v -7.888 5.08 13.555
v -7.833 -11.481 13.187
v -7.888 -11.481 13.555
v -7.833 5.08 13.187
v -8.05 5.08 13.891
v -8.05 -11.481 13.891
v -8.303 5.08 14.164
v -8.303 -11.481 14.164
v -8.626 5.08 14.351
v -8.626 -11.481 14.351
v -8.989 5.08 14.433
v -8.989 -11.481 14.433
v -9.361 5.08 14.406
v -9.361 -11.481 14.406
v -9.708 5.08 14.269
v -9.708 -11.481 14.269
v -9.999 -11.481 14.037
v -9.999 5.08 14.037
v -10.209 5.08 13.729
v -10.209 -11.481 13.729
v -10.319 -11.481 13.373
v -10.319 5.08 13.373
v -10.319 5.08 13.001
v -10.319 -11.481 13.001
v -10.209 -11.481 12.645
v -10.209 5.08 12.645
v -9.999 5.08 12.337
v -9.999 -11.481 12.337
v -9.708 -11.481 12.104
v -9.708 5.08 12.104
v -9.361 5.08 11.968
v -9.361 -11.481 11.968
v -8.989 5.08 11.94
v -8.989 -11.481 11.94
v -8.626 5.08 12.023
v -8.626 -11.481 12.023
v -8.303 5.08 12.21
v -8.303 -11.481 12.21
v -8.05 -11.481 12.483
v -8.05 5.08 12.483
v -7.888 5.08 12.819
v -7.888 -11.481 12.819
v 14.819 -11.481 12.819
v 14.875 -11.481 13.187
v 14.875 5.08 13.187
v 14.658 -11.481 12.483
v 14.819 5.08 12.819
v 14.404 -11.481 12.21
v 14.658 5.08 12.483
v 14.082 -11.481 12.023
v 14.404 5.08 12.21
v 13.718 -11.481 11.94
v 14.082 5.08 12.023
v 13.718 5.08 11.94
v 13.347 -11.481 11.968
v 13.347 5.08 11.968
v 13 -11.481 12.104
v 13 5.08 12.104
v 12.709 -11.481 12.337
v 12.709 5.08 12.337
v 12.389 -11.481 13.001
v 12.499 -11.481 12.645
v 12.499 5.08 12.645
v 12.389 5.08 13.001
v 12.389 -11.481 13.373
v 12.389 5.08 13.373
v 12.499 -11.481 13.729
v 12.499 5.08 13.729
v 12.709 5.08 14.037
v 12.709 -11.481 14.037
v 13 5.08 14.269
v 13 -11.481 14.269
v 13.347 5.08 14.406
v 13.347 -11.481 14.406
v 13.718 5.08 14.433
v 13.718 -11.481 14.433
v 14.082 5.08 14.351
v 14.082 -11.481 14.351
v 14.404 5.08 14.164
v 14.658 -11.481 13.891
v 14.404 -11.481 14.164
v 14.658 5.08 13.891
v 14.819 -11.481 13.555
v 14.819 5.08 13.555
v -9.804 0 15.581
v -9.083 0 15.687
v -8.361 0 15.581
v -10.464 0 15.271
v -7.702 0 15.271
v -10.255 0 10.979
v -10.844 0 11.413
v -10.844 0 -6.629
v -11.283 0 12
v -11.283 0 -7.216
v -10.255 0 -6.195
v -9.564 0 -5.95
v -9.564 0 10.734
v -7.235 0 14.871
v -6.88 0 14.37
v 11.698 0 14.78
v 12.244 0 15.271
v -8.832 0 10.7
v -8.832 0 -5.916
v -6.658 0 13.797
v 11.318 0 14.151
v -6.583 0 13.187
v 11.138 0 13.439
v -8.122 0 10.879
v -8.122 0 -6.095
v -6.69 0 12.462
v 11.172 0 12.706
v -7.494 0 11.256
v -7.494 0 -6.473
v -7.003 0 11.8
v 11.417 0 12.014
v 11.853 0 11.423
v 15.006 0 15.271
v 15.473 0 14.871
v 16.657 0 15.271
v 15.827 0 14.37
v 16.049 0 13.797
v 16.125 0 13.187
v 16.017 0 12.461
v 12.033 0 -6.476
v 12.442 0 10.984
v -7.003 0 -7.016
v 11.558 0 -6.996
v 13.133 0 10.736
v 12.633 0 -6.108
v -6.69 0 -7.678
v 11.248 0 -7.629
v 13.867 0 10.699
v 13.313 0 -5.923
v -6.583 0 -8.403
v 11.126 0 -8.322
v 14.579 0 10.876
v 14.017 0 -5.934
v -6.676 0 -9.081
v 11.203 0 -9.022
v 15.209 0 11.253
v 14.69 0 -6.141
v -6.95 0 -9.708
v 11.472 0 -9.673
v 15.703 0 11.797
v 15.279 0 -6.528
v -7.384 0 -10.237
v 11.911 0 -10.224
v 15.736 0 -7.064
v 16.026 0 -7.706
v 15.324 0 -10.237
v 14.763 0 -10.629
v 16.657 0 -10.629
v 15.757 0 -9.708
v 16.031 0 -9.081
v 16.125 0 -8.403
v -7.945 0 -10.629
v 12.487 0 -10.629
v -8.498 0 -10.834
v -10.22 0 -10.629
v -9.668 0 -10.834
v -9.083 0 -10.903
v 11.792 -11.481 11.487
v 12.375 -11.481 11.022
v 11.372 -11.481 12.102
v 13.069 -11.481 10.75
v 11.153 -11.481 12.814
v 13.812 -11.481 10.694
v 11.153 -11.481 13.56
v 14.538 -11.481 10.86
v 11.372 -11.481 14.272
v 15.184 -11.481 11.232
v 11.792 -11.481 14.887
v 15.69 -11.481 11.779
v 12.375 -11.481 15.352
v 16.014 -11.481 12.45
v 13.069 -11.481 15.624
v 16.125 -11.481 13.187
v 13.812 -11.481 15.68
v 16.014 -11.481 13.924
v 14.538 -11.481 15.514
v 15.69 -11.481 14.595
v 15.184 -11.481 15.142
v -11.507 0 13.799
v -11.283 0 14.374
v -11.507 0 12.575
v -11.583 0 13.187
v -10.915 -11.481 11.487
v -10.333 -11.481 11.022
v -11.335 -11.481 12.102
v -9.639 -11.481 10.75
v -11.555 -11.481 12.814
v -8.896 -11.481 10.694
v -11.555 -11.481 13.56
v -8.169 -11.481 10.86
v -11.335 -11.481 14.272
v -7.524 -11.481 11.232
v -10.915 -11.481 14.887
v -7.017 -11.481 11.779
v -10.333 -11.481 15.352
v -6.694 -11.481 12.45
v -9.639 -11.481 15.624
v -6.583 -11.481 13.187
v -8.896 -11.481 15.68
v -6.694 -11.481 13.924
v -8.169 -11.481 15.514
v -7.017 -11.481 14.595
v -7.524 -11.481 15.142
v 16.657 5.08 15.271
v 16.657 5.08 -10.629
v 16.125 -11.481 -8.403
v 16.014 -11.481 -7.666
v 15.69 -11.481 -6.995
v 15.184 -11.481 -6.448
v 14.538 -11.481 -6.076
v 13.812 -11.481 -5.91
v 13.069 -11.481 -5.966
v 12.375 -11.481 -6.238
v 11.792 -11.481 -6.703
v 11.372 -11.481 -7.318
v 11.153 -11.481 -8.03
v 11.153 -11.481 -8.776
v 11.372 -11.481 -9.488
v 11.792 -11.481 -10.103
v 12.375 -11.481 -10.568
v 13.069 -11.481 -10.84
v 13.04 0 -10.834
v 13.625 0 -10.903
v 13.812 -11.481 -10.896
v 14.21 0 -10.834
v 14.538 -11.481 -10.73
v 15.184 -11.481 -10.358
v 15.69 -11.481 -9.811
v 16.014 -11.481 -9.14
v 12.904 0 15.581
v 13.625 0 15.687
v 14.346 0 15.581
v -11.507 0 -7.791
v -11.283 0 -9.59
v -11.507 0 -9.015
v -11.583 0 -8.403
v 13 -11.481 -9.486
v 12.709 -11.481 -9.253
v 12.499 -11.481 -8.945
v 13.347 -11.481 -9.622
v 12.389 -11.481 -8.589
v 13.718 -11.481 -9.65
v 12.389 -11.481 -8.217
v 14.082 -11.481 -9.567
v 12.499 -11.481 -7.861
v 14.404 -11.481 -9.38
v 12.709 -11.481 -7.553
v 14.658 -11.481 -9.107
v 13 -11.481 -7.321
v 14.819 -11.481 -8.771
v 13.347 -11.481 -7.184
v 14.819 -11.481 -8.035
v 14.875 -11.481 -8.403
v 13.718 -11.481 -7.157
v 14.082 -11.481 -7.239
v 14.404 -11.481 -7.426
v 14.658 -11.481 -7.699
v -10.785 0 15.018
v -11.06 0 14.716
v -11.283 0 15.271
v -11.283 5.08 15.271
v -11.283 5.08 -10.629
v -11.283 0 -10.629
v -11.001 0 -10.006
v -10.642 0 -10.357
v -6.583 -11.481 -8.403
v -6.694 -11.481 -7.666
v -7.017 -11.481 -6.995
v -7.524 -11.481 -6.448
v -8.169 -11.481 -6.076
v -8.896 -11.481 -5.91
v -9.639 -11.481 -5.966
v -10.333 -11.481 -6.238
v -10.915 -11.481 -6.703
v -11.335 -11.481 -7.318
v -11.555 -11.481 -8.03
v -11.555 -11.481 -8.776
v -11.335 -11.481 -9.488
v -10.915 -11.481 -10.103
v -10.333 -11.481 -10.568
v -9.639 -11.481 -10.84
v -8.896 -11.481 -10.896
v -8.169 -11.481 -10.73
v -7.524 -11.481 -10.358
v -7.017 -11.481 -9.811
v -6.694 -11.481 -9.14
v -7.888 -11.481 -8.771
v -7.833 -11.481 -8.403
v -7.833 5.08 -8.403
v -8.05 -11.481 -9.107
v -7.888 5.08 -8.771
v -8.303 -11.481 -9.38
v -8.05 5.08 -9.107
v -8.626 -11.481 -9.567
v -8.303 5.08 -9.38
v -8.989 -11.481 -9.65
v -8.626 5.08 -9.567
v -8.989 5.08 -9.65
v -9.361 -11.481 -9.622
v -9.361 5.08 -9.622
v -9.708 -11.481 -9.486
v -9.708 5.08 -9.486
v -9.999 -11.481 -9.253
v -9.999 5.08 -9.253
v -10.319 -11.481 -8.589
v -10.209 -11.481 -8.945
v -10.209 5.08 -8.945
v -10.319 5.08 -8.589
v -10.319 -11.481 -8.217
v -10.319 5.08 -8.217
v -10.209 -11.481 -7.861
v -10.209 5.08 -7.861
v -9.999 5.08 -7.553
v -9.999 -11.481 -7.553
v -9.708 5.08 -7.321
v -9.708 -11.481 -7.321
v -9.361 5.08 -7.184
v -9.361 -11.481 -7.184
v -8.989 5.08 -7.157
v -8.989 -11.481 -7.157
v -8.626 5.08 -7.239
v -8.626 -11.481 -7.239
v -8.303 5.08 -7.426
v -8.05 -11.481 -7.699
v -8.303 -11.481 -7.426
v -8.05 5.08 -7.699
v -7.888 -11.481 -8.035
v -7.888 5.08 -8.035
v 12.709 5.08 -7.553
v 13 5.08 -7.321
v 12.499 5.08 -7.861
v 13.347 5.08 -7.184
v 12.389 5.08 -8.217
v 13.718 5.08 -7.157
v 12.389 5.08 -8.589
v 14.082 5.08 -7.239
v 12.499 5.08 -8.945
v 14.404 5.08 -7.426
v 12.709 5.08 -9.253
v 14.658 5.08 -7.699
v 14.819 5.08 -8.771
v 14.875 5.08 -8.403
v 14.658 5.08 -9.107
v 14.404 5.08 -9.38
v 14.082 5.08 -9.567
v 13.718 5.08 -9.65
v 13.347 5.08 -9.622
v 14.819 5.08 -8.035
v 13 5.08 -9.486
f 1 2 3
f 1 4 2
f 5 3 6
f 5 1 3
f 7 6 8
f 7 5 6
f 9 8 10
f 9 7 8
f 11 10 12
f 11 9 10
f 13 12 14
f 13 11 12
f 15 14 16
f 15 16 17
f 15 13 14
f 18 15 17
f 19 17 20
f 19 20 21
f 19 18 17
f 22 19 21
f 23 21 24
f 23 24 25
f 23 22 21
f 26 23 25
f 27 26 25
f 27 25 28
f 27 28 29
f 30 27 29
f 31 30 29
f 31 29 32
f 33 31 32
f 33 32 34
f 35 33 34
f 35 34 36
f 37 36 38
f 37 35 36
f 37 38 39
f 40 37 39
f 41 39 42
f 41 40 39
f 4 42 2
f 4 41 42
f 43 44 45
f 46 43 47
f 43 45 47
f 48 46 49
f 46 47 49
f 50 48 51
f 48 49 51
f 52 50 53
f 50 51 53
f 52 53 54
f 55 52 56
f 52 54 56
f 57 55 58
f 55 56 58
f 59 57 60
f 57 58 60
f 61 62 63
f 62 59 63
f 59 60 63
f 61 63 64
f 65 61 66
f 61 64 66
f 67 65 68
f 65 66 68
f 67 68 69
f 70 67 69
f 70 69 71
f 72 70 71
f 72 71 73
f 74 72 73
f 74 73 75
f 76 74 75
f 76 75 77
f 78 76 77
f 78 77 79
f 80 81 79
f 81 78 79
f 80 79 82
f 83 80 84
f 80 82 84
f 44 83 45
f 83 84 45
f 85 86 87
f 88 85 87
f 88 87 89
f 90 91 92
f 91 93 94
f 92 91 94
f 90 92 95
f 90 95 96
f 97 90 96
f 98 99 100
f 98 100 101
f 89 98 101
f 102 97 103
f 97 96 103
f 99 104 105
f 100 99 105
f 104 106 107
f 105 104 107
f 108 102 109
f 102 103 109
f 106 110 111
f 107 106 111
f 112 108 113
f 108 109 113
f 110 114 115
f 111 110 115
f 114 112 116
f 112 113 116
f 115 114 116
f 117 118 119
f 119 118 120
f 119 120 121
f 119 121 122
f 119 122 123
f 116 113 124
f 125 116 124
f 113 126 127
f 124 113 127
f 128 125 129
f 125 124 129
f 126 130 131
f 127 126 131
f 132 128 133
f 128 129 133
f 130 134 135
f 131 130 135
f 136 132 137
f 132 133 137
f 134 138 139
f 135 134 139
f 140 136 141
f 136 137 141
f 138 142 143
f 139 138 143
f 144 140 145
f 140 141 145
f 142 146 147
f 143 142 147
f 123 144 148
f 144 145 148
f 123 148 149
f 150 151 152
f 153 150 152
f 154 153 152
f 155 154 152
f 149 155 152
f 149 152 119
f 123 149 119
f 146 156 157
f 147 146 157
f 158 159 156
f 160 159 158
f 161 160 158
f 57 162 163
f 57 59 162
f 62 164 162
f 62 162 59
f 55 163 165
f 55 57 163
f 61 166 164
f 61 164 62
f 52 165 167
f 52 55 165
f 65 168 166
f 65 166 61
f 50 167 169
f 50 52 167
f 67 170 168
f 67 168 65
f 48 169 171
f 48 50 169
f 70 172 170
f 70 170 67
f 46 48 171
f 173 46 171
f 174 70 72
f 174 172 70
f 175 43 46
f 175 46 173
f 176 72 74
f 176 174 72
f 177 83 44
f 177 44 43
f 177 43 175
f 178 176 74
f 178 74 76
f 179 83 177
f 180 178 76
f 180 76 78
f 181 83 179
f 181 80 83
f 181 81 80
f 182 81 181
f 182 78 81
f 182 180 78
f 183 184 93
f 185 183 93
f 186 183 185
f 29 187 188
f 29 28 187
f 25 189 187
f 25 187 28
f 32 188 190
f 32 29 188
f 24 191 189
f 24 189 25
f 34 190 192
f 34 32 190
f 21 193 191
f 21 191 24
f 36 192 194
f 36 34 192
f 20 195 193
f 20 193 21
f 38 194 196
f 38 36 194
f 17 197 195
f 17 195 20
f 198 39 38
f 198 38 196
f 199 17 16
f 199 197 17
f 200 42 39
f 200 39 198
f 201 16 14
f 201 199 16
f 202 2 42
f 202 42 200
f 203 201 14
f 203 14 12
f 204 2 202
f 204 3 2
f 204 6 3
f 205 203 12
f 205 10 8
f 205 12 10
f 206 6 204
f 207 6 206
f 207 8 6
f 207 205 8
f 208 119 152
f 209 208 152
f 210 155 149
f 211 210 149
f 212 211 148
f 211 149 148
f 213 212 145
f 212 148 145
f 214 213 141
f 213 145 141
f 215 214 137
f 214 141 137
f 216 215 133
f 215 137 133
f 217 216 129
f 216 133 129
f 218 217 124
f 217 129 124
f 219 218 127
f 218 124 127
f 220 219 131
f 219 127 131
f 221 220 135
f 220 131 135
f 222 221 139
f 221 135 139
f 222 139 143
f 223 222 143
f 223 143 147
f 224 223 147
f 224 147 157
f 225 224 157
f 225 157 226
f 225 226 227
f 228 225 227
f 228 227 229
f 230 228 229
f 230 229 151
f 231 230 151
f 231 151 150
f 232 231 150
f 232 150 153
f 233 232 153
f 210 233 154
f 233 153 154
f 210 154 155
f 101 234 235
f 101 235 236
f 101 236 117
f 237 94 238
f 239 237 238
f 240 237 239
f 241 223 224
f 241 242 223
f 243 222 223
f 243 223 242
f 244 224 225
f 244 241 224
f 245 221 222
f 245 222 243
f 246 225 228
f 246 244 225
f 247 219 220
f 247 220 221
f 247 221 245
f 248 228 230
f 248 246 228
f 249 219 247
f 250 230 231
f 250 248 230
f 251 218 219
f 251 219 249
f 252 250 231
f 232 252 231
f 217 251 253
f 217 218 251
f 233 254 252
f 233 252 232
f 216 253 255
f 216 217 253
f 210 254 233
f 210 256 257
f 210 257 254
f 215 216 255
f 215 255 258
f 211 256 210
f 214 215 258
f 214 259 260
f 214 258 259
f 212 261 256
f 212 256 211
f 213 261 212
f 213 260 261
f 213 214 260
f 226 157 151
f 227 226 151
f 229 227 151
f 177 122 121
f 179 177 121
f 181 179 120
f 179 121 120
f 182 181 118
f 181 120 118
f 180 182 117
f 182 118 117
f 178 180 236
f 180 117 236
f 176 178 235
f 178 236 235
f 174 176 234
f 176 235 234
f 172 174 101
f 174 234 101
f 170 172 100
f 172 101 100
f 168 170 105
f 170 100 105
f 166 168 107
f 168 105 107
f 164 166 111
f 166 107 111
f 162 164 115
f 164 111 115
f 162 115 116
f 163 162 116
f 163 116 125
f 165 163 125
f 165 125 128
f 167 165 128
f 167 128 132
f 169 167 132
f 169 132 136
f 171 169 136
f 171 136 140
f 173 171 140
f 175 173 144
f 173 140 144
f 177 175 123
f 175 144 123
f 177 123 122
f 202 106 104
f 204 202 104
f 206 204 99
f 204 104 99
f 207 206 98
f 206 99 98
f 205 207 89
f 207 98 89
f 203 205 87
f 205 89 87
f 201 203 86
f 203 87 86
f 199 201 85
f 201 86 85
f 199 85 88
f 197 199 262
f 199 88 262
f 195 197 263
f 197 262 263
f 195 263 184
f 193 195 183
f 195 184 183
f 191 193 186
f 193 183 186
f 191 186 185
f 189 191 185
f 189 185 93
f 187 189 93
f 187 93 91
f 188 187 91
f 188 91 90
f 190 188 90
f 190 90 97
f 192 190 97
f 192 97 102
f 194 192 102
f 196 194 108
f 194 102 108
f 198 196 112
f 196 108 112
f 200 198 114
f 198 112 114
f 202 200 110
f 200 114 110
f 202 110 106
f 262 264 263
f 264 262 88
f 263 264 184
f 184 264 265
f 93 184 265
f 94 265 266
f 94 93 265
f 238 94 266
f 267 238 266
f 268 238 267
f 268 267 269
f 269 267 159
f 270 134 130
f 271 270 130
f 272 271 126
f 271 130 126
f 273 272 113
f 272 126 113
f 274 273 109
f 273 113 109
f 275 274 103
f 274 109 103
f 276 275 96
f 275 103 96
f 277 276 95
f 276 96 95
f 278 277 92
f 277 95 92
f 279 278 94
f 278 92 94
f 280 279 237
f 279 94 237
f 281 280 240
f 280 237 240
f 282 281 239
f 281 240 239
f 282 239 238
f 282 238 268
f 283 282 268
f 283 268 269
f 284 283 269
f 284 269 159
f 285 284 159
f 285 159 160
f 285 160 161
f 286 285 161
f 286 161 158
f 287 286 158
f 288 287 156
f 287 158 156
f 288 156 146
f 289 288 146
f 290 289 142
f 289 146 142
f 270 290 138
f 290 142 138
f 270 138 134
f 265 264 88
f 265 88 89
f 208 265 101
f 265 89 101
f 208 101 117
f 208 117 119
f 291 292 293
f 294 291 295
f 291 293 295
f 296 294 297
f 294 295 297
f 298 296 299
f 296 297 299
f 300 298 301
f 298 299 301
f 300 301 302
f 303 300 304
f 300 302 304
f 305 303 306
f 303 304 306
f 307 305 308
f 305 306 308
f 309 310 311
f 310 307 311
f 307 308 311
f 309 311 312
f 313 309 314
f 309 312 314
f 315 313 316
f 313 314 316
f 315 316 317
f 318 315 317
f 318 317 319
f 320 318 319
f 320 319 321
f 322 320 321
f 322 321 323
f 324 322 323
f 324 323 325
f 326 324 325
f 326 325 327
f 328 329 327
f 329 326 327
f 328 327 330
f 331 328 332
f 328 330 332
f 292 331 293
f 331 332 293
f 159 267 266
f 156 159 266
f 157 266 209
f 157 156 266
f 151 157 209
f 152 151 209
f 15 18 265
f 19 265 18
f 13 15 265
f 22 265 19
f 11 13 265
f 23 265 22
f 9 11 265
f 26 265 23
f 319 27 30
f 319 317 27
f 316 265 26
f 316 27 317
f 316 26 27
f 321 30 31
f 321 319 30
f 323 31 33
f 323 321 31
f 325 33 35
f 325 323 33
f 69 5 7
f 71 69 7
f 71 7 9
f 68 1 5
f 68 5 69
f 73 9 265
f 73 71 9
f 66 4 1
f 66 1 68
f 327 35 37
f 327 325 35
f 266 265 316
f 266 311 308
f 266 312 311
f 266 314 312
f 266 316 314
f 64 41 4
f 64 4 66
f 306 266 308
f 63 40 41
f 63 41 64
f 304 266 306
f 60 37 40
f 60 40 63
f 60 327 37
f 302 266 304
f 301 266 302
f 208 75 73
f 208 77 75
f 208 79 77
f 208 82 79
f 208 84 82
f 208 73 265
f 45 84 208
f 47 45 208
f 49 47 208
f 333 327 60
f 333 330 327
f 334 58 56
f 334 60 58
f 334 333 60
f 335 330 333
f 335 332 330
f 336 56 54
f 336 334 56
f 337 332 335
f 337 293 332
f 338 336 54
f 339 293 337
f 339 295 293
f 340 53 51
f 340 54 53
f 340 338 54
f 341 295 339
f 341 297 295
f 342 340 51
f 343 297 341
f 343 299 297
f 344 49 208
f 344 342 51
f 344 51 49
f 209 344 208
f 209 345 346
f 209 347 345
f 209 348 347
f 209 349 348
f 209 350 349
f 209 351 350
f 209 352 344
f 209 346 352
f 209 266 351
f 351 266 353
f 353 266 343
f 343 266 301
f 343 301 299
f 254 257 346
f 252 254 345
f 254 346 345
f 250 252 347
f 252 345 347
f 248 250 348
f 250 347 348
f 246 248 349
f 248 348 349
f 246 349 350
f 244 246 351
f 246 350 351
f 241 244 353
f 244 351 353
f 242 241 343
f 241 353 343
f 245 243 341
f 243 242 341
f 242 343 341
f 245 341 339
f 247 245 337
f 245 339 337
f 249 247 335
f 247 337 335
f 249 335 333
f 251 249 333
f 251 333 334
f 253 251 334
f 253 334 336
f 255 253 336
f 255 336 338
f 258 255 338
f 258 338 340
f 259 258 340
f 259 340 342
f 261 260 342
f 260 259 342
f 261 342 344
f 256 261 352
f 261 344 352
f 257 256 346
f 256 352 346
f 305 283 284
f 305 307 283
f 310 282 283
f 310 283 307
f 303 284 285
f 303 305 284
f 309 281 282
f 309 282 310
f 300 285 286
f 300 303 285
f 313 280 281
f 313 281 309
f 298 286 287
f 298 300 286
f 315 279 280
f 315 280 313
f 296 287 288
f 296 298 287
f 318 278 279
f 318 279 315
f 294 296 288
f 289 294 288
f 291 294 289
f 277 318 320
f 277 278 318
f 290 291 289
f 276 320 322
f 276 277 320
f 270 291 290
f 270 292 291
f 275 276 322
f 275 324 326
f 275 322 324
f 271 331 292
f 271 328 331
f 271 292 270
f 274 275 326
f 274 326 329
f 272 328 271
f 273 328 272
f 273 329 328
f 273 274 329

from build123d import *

# Parameters (mm, degrees)
SKETCH1_W               = 27.94
SKETCH1_H               = 25.9
BOSS_EXTRUDE1_DEPTH     = 5.08
SKETCH2_R               = 2.5
SKETCH2_R_2             = 1.25
BOSS_EXTRUDE2_DEPTH     = 11.4808
SKETCH3_R               = 1.25
CUT_EXTRUDE1_DEPTH      = 1
CUT_EXTRUDE1_DEPTH_BACK = 17.5608


with BuildPart() as part:
    # Sketch1 → Boss-Extrude1 (new body)
    with BuildSketch(Plane(origin=(0, 0, 0), x_dir=(1, 0, 0), z_dir=(0, 1, 0))):
        with Locations((2.687100719, -2.320830935)):
            Rectangle(SKETCH1_W, SKETCH1_H)
    extrude(amount=BOSS_EXTRUDE1_DEPTH)

    # Sketch2 → Boss-Extrude2 (add)
    with BuildSketch(Plane.XZ):
        with Locations((-9.082699611, 13.186946911)):
            Circle(SKETCH2_R)
        with Locations((-9.082699611, 13.186946911)):
            Circle(SKETCH2_R_2, mode=Mode.SUBTRACT)
        with Locations((13.624900389, 13.186946911)):
            Circle(SKETCH2_R)
        with Locations((13.624900389, 13.186946911)):
            Circle(SKETCH2_R_2, mode=Mode.SUBTRACT)
        with Locations((-9.082699611, -8.403053089)):
            Circle(SKETCH2_R)
        with Locations((-9.082699611, -8.403053089)):
            Circle(SKETCH2_R_2, mode=Mode.SUBTRACT)
        with Locations((13.624900389, -8.403053089)):
            Circle(SKETCH2_R)
        with Locations((13.624900389, -8.403053089)):
            Circle(SKETCH2_R_2, mode=Mode.SUBTRACT)
    extrude(amount=BOSS_EXTRUDE2_DEPTH)

    # Sketch3 → Cut-Extrude1 (cut, two sides)
    with BuildSketch(Plane(origin=(0, 5.08, 0), x_dir=(1, 0, 0), z_dir=(0, 1, 0))) as cut_extrude1_sk:
        with Locations((13.624900389, 8.403053089)):
            Circle(SKETCH3_R)
        with Locations((-9.082699611, 8.403053089)):
            Circle(SKETCH3_R)
        with Locations((13.624900389, -13.186946911)):
            Circle(SKETCH3_R)
        with Locations((-9.082699611, -13.186946911)):
            Circle(SKETCH3_R)
    extrude(amount=CUT_EXTRUDE1_DEPTH, mode=Mode.SUBTRACT)
    extrude(cut_extrude1_sk.sketch, amount=-CUT_EXTRUDE1_DEPTH_BACK, mode=Mode.SUBTRACT)


solid = part.part
